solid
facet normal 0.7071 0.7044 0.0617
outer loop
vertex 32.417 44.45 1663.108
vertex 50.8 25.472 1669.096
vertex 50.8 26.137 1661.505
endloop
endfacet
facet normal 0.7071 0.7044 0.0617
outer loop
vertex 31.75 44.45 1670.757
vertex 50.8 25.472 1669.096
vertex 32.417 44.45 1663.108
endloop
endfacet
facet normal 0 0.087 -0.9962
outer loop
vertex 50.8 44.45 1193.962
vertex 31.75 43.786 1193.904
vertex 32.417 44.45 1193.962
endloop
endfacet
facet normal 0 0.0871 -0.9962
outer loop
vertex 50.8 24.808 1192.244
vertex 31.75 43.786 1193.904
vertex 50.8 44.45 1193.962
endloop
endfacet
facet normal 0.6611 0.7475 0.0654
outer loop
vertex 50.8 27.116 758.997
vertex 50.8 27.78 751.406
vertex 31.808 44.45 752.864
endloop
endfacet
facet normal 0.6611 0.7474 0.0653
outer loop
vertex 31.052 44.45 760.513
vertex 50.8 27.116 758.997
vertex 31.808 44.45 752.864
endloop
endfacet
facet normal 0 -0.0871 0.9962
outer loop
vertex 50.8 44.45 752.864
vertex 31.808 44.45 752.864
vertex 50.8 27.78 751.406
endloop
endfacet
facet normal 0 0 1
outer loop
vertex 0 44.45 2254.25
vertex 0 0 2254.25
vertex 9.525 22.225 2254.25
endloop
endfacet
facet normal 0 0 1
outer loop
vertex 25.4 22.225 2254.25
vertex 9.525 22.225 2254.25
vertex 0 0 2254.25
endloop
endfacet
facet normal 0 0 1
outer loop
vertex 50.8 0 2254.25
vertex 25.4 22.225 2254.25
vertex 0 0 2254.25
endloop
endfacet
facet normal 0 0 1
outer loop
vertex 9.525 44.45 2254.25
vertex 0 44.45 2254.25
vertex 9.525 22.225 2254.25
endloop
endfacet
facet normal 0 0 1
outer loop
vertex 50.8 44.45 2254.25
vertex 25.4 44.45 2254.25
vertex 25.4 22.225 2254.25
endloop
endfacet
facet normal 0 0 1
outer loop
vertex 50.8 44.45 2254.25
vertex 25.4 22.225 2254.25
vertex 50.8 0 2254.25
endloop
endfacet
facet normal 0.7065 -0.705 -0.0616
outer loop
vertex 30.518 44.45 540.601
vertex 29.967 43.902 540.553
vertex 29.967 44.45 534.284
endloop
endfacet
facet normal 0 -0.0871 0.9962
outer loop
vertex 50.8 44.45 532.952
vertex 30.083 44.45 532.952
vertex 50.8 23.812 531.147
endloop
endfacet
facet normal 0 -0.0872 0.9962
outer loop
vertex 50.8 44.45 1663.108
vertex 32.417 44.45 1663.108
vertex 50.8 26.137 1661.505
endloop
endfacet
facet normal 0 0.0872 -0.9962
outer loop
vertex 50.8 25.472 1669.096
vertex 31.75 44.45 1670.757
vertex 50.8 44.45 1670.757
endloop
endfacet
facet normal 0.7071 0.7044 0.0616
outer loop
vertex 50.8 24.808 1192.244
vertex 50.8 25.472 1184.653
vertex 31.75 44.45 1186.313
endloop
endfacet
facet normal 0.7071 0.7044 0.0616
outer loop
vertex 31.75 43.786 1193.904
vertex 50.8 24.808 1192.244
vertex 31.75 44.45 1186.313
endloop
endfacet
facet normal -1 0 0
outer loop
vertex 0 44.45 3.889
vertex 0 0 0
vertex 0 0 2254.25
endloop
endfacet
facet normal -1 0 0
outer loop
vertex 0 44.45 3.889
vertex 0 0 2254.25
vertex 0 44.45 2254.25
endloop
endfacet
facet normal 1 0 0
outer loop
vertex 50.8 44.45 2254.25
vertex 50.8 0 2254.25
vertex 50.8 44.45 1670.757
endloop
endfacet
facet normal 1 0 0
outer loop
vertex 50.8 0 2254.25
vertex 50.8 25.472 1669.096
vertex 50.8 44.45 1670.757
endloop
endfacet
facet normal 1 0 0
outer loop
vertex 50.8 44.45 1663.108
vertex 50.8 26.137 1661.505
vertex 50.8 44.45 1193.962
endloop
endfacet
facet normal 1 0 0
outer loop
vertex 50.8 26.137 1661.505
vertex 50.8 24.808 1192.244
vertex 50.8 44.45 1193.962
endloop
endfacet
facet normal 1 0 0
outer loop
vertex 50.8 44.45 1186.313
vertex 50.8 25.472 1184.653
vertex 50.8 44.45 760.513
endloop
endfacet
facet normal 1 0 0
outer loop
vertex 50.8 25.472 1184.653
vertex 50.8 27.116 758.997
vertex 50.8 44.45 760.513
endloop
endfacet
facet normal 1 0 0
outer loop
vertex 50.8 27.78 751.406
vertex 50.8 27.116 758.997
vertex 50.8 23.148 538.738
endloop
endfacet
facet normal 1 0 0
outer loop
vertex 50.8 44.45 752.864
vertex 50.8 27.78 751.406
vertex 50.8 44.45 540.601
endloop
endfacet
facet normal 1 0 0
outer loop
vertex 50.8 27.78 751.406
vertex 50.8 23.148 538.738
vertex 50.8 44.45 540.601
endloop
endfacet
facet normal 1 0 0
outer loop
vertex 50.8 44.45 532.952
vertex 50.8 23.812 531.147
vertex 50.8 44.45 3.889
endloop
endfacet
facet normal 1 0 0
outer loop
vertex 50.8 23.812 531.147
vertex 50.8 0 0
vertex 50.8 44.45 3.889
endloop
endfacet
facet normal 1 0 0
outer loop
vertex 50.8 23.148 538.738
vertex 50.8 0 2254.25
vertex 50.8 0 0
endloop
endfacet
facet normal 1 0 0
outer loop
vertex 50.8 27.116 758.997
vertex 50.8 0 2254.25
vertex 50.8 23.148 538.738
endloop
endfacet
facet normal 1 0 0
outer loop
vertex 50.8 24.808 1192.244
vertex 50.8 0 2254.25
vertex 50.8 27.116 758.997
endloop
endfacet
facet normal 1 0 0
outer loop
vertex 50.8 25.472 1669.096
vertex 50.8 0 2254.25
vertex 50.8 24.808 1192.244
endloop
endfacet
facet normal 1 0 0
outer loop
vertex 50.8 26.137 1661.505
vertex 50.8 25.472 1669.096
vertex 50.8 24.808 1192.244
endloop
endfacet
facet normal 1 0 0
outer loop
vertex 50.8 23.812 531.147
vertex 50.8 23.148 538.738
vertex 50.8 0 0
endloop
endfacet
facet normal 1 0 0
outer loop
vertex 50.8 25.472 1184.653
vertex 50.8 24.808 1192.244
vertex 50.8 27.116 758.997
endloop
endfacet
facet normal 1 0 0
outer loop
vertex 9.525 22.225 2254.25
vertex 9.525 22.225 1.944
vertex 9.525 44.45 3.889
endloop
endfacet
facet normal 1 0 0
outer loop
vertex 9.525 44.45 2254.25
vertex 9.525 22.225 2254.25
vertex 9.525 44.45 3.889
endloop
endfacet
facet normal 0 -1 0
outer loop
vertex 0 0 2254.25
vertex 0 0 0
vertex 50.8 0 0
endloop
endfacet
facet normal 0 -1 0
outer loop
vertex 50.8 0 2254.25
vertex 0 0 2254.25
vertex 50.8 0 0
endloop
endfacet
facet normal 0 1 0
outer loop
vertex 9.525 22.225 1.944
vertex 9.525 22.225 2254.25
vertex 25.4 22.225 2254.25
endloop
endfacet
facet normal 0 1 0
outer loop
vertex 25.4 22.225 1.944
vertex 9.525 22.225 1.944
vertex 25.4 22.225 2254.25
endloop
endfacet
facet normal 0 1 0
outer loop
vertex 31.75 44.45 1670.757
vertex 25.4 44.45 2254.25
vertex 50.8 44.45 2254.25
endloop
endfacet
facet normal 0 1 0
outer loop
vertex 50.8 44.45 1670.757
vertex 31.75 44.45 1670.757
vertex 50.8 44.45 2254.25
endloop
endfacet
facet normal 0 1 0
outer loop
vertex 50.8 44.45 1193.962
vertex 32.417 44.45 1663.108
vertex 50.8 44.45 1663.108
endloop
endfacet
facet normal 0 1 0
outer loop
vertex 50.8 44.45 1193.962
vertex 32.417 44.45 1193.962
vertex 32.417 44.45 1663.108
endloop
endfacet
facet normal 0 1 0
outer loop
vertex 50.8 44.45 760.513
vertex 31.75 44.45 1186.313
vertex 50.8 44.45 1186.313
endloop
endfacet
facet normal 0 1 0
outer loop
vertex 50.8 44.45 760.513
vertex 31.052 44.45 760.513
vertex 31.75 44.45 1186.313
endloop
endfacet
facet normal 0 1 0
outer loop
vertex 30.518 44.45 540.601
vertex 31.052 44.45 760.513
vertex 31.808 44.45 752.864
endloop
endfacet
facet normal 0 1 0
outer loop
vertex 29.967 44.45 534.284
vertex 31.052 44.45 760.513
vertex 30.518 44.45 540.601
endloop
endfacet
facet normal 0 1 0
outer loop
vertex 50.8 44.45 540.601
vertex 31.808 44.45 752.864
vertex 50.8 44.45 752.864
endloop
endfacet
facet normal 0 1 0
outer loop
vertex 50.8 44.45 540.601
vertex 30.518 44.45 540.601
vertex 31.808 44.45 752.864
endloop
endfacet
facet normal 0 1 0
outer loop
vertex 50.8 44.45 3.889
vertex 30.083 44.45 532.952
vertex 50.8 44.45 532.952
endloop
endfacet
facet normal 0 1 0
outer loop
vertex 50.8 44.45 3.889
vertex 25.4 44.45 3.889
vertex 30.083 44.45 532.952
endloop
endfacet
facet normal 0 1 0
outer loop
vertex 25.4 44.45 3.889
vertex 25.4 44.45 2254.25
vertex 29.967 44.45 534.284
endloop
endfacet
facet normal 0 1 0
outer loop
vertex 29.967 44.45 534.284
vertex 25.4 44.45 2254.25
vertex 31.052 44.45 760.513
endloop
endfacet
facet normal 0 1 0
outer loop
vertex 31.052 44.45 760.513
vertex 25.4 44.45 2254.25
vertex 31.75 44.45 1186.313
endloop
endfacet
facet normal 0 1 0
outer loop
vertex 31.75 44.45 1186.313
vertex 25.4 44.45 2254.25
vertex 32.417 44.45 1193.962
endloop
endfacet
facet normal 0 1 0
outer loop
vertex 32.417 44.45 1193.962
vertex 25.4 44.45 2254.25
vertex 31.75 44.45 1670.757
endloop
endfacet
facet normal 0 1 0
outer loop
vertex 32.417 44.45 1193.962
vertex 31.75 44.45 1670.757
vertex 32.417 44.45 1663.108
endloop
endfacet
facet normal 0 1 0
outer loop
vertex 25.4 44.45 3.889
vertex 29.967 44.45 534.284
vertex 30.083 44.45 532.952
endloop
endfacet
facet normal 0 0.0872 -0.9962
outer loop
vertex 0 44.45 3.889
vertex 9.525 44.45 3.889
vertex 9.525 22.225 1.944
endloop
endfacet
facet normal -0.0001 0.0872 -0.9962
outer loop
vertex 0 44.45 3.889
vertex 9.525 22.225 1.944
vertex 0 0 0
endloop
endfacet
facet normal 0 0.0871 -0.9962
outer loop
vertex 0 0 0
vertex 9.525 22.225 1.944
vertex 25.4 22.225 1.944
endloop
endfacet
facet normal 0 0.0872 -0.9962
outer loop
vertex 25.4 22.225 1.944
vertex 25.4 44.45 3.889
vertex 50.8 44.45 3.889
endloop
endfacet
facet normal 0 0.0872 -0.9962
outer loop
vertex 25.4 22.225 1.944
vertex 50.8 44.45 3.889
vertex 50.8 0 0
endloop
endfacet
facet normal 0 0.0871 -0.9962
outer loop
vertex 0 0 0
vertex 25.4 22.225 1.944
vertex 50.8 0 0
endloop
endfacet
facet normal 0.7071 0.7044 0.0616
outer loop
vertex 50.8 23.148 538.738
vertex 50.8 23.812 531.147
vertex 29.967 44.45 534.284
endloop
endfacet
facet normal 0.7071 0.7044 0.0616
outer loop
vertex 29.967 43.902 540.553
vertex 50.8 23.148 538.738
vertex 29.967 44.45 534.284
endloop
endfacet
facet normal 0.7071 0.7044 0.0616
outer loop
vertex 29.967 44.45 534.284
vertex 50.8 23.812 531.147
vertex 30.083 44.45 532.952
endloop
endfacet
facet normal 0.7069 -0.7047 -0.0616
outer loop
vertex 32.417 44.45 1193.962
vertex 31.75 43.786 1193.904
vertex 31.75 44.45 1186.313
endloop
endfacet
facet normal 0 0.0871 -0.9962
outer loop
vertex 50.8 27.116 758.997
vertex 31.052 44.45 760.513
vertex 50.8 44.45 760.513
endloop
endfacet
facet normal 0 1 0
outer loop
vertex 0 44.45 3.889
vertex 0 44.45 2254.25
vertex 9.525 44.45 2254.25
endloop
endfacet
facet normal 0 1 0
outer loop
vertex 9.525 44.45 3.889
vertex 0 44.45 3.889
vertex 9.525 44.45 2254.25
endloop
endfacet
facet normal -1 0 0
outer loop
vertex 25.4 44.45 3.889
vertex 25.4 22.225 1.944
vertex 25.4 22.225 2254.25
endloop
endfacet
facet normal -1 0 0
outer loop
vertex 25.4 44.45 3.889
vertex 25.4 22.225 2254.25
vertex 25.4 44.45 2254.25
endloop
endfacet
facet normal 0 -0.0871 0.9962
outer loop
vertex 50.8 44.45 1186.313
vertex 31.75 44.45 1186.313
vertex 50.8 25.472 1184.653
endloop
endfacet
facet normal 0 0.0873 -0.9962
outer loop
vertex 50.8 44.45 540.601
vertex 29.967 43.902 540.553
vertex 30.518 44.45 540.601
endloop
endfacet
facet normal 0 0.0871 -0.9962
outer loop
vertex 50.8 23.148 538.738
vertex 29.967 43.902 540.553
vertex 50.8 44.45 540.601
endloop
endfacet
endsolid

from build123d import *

# Parameters (mm, degrees)
F0_W      = 50.8
F0_H      = 44.45
F1_DEPTH  = 2254.25
F2_W      = 15.875
F2_H      = 22.225
F3_DEPTH  = 2260.6
F5_DEPTH  = 76.2
F11_DEPTH = 7.62
F13_DEPTH = 7.62
F15_DEPTH = 7.62
F17_DEPTH = 7.62


with BuildPart() as f1:
    # F0 (on Top) → F1 (new body)
    with BuildSketch(Plane.XY):
        with Locations((25.4, 22.225)):
            Rectangle(F0_W, F0_H)
    extrude(amount=F1_DEPTH)

    # F2 (on face) → F3 (cut)
    with BuildSketch(Plane.XY.offset(2254.25)):
        with Locations((17.4625, 33.3375)):
            Rectangle(F2_W, F2_H)
    extrude(amount=-F3_DEPTH, mode=Mode.SUBTRACT)

    # F4 (on face) → F5 (cut)
    with BuildSketch(Plane.YZ.offset(50.8)):
        Polygon((44.45, 3.8888710937), (0, 0), (44.45, 0), align=None)
    extrude(amount=-F5_DEPTH, mode=Mode.SUBTRACT)

    # F10 (on offset) → F11 (cut)
    with BuildSketch(Plane(origin=(0, -45.9354342152, 525.0444156293), x_dir=(1, 0, 0), z_dir=(0, 0.0871557427, -0.9961946981))):
        Polygon((68.3375078249, -83.8695270738), (52.6410068005, -68.1730260494), (29.9672586024, -90.8467742476), (45.6637596268, -106.543275272), align=None)
    extrude(amount=-F11_DEPTH, mode=Mode.SUBTRACT)

    # F12 (on offset) → F13 (cut)
    with BuildSketch(Plane(origin=(0, -65.0290785576, 743.2857691137), x_dir=(1, 0, 0), z_dir=(0, 0.0871557427, -0.9961946981))):
        Polygon((50.8, -93.1639036529), (30.0833409598, -111.4171829045), (48.0814183777, -131.8441992288), (68.7980774179, -113.5909199772), align=None)
    extrude(amount=-F13_DEPTH, mode=Mode.SUBTRACT)

    # F14 (on offset) → F15 (cut)
    with BuildSketch(Plane(origin=(0, -102.662928276, 1173.4426397497), x_dir=(1, 0, 0), z_dir=(0, 0.0871557427, -0.9961946981))):
        Polygon((50.8, -128.6248757626), (31.75, -147.6748757626), (46.4404728378, -162.3653486004), (65.4904728378, -143.3153486004), align=None)
    extrude(amount=-F15_DEPTH, mode=Mode.SUBTRACT)

    # F16 (on offset) → F17 (cut)
    with BuildSketch(Plane(origin=(0, -144.7242897261, 1654.2062010488), x_dir=(1, 0, 0), z_dir=(0, 0.0871557427, -0.9961946981))):
        Polygon((50.8, -170.8469047802), (31.75, -189.8969047802), (46.5661471594, -204.7130519396), (65.6161471594, -185.6630519396), align=None)
    extrude(amount=F17_DEPTH, mode=Mode.SUBTRACT)


solid = f1.part
